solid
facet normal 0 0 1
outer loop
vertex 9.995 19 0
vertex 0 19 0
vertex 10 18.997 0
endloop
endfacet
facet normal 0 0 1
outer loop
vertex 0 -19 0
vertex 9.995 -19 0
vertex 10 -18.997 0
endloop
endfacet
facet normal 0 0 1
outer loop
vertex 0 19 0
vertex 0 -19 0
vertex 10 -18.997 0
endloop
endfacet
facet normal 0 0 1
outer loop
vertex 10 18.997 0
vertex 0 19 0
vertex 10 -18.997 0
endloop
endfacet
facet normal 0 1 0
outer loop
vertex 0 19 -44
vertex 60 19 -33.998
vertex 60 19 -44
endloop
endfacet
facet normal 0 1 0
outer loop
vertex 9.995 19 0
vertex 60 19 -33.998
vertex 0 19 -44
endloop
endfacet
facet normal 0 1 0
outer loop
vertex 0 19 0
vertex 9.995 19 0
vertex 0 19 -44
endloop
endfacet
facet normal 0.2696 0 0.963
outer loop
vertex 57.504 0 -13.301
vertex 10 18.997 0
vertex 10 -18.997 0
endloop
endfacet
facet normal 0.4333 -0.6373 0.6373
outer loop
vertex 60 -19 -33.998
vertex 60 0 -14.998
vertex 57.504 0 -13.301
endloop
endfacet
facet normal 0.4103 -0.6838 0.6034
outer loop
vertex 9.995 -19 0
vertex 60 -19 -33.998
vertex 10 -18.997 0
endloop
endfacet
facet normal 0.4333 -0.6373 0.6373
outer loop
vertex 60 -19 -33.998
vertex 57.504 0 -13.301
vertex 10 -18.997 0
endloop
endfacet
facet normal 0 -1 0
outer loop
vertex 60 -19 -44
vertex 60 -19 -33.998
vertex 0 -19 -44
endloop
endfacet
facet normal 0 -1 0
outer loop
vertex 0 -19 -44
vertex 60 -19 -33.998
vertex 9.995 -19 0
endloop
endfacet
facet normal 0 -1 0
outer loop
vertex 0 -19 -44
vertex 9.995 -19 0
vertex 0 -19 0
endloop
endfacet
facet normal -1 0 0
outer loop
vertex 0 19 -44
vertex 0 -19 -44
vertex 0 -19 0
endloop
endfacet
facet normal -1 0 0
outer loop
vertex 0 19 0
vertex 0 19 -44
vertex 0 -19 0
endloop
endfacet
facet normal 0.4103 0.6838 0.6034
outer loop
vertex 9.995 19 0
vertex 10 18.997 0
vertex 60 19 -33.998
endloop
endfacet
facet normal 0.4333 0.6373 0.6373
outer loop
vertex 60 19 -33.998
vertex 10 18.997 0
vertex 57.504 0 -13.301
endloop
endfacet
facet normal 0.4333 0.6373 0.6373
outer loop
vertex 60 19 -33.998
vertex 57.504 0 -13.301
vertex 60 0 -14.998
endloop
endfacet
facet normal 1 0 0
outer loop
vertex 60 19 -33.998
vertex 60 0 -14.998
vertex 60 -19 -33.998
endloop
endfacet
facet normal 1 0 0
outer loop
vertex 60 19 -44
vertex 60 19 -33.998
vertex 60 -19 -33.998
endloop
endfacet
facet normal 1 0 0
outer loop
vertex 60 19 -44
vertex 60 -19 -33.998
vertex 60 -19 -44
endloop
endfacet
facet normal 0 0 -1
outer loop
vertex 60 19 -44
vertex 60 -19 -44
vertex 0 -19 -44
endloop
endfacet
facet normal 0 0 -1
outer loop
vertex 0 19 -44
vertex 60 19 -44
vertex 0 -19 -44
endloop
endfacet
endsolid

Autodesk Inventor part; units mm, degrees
ref_plane "YZ Plane" through (0, 0, 0) normal (1, 0, 0) x (0, 1, 0)
ref_plane "XZ Plane" through (0, 0, 0) normal (0, 1, 0) x (-1, 0, 0)
sketch "草圖1" plane through (0, 0, 0) normal (0, 1, 0) x (-1, 0, 0)
  line L0 (0, 0) -> (-60, 0)
  line L1 (-60, 0) -> (-60, -44)
  line L2 (-60, -44) -> (0, -44)
  line L3 (0, -44) -> (0, 0)
  dimension "d0" = 60
  dimension "d1" = 44
extrude "擠出1" add sketch "草圖1" along normal mid plane 38
sketch "草圖2" plane through (0, 19, 0) normal (0, 1, 0) x (1, 0, 0)
  line L0 (0, 0) -> (60, 0) projected
  line L1 (10, 0) -> (60, 14)
  line L2 (60, 0) -> (60, 44) projected
  dimension "d4" = 10
  dimension "d5" = 30
extrude "擠出2" cut sketch "草圖2" against normal blind 40
sketch "草圖3" plane through (60, -19, -44) normal (1, 0, 0) x (0, 0, -1)
  line L0 (-30, 18) -> (-10, 38)
  line L1 (0, 38) -> (-44, 38) projected
  line L2 (-30, 38) -> (-30, 0) projected
  point P0 (-44, 19)
  dimension "d8" = 20
  dimension "d9" = 20
ref_plane "工作平面1" through (10, 19, 0) normal (-0.4333, -0.6373, -0.6373) x (0.8269, 0, -0.5623)
sketch "草圖4" plane through (10, 19, 0) normal (-0.4333, -0.6373, -0.6373) x (0.8269, 0, -0.5623)
  line L0 (-15.1543, -12.3218) -> (93.717, -12.3218)
  line L1 (93.717, -12.3218) -> (93.717, 28.8166)
  line L2 (93.717, 28.8166) -> (-15.1543, 28.8166)
  line L3 (-15.1543, 28.8166) -> (-15.1543, -12.3218)
  point P0 (-8.2693, 11.0588)
extrude "擠出3" cut sketch "草圖4" against normal blind 40
mirror "鏡射1" about plane through (0, 0, 0) normal (0, 1, 0) of "擠出3"
properties part number "43"
